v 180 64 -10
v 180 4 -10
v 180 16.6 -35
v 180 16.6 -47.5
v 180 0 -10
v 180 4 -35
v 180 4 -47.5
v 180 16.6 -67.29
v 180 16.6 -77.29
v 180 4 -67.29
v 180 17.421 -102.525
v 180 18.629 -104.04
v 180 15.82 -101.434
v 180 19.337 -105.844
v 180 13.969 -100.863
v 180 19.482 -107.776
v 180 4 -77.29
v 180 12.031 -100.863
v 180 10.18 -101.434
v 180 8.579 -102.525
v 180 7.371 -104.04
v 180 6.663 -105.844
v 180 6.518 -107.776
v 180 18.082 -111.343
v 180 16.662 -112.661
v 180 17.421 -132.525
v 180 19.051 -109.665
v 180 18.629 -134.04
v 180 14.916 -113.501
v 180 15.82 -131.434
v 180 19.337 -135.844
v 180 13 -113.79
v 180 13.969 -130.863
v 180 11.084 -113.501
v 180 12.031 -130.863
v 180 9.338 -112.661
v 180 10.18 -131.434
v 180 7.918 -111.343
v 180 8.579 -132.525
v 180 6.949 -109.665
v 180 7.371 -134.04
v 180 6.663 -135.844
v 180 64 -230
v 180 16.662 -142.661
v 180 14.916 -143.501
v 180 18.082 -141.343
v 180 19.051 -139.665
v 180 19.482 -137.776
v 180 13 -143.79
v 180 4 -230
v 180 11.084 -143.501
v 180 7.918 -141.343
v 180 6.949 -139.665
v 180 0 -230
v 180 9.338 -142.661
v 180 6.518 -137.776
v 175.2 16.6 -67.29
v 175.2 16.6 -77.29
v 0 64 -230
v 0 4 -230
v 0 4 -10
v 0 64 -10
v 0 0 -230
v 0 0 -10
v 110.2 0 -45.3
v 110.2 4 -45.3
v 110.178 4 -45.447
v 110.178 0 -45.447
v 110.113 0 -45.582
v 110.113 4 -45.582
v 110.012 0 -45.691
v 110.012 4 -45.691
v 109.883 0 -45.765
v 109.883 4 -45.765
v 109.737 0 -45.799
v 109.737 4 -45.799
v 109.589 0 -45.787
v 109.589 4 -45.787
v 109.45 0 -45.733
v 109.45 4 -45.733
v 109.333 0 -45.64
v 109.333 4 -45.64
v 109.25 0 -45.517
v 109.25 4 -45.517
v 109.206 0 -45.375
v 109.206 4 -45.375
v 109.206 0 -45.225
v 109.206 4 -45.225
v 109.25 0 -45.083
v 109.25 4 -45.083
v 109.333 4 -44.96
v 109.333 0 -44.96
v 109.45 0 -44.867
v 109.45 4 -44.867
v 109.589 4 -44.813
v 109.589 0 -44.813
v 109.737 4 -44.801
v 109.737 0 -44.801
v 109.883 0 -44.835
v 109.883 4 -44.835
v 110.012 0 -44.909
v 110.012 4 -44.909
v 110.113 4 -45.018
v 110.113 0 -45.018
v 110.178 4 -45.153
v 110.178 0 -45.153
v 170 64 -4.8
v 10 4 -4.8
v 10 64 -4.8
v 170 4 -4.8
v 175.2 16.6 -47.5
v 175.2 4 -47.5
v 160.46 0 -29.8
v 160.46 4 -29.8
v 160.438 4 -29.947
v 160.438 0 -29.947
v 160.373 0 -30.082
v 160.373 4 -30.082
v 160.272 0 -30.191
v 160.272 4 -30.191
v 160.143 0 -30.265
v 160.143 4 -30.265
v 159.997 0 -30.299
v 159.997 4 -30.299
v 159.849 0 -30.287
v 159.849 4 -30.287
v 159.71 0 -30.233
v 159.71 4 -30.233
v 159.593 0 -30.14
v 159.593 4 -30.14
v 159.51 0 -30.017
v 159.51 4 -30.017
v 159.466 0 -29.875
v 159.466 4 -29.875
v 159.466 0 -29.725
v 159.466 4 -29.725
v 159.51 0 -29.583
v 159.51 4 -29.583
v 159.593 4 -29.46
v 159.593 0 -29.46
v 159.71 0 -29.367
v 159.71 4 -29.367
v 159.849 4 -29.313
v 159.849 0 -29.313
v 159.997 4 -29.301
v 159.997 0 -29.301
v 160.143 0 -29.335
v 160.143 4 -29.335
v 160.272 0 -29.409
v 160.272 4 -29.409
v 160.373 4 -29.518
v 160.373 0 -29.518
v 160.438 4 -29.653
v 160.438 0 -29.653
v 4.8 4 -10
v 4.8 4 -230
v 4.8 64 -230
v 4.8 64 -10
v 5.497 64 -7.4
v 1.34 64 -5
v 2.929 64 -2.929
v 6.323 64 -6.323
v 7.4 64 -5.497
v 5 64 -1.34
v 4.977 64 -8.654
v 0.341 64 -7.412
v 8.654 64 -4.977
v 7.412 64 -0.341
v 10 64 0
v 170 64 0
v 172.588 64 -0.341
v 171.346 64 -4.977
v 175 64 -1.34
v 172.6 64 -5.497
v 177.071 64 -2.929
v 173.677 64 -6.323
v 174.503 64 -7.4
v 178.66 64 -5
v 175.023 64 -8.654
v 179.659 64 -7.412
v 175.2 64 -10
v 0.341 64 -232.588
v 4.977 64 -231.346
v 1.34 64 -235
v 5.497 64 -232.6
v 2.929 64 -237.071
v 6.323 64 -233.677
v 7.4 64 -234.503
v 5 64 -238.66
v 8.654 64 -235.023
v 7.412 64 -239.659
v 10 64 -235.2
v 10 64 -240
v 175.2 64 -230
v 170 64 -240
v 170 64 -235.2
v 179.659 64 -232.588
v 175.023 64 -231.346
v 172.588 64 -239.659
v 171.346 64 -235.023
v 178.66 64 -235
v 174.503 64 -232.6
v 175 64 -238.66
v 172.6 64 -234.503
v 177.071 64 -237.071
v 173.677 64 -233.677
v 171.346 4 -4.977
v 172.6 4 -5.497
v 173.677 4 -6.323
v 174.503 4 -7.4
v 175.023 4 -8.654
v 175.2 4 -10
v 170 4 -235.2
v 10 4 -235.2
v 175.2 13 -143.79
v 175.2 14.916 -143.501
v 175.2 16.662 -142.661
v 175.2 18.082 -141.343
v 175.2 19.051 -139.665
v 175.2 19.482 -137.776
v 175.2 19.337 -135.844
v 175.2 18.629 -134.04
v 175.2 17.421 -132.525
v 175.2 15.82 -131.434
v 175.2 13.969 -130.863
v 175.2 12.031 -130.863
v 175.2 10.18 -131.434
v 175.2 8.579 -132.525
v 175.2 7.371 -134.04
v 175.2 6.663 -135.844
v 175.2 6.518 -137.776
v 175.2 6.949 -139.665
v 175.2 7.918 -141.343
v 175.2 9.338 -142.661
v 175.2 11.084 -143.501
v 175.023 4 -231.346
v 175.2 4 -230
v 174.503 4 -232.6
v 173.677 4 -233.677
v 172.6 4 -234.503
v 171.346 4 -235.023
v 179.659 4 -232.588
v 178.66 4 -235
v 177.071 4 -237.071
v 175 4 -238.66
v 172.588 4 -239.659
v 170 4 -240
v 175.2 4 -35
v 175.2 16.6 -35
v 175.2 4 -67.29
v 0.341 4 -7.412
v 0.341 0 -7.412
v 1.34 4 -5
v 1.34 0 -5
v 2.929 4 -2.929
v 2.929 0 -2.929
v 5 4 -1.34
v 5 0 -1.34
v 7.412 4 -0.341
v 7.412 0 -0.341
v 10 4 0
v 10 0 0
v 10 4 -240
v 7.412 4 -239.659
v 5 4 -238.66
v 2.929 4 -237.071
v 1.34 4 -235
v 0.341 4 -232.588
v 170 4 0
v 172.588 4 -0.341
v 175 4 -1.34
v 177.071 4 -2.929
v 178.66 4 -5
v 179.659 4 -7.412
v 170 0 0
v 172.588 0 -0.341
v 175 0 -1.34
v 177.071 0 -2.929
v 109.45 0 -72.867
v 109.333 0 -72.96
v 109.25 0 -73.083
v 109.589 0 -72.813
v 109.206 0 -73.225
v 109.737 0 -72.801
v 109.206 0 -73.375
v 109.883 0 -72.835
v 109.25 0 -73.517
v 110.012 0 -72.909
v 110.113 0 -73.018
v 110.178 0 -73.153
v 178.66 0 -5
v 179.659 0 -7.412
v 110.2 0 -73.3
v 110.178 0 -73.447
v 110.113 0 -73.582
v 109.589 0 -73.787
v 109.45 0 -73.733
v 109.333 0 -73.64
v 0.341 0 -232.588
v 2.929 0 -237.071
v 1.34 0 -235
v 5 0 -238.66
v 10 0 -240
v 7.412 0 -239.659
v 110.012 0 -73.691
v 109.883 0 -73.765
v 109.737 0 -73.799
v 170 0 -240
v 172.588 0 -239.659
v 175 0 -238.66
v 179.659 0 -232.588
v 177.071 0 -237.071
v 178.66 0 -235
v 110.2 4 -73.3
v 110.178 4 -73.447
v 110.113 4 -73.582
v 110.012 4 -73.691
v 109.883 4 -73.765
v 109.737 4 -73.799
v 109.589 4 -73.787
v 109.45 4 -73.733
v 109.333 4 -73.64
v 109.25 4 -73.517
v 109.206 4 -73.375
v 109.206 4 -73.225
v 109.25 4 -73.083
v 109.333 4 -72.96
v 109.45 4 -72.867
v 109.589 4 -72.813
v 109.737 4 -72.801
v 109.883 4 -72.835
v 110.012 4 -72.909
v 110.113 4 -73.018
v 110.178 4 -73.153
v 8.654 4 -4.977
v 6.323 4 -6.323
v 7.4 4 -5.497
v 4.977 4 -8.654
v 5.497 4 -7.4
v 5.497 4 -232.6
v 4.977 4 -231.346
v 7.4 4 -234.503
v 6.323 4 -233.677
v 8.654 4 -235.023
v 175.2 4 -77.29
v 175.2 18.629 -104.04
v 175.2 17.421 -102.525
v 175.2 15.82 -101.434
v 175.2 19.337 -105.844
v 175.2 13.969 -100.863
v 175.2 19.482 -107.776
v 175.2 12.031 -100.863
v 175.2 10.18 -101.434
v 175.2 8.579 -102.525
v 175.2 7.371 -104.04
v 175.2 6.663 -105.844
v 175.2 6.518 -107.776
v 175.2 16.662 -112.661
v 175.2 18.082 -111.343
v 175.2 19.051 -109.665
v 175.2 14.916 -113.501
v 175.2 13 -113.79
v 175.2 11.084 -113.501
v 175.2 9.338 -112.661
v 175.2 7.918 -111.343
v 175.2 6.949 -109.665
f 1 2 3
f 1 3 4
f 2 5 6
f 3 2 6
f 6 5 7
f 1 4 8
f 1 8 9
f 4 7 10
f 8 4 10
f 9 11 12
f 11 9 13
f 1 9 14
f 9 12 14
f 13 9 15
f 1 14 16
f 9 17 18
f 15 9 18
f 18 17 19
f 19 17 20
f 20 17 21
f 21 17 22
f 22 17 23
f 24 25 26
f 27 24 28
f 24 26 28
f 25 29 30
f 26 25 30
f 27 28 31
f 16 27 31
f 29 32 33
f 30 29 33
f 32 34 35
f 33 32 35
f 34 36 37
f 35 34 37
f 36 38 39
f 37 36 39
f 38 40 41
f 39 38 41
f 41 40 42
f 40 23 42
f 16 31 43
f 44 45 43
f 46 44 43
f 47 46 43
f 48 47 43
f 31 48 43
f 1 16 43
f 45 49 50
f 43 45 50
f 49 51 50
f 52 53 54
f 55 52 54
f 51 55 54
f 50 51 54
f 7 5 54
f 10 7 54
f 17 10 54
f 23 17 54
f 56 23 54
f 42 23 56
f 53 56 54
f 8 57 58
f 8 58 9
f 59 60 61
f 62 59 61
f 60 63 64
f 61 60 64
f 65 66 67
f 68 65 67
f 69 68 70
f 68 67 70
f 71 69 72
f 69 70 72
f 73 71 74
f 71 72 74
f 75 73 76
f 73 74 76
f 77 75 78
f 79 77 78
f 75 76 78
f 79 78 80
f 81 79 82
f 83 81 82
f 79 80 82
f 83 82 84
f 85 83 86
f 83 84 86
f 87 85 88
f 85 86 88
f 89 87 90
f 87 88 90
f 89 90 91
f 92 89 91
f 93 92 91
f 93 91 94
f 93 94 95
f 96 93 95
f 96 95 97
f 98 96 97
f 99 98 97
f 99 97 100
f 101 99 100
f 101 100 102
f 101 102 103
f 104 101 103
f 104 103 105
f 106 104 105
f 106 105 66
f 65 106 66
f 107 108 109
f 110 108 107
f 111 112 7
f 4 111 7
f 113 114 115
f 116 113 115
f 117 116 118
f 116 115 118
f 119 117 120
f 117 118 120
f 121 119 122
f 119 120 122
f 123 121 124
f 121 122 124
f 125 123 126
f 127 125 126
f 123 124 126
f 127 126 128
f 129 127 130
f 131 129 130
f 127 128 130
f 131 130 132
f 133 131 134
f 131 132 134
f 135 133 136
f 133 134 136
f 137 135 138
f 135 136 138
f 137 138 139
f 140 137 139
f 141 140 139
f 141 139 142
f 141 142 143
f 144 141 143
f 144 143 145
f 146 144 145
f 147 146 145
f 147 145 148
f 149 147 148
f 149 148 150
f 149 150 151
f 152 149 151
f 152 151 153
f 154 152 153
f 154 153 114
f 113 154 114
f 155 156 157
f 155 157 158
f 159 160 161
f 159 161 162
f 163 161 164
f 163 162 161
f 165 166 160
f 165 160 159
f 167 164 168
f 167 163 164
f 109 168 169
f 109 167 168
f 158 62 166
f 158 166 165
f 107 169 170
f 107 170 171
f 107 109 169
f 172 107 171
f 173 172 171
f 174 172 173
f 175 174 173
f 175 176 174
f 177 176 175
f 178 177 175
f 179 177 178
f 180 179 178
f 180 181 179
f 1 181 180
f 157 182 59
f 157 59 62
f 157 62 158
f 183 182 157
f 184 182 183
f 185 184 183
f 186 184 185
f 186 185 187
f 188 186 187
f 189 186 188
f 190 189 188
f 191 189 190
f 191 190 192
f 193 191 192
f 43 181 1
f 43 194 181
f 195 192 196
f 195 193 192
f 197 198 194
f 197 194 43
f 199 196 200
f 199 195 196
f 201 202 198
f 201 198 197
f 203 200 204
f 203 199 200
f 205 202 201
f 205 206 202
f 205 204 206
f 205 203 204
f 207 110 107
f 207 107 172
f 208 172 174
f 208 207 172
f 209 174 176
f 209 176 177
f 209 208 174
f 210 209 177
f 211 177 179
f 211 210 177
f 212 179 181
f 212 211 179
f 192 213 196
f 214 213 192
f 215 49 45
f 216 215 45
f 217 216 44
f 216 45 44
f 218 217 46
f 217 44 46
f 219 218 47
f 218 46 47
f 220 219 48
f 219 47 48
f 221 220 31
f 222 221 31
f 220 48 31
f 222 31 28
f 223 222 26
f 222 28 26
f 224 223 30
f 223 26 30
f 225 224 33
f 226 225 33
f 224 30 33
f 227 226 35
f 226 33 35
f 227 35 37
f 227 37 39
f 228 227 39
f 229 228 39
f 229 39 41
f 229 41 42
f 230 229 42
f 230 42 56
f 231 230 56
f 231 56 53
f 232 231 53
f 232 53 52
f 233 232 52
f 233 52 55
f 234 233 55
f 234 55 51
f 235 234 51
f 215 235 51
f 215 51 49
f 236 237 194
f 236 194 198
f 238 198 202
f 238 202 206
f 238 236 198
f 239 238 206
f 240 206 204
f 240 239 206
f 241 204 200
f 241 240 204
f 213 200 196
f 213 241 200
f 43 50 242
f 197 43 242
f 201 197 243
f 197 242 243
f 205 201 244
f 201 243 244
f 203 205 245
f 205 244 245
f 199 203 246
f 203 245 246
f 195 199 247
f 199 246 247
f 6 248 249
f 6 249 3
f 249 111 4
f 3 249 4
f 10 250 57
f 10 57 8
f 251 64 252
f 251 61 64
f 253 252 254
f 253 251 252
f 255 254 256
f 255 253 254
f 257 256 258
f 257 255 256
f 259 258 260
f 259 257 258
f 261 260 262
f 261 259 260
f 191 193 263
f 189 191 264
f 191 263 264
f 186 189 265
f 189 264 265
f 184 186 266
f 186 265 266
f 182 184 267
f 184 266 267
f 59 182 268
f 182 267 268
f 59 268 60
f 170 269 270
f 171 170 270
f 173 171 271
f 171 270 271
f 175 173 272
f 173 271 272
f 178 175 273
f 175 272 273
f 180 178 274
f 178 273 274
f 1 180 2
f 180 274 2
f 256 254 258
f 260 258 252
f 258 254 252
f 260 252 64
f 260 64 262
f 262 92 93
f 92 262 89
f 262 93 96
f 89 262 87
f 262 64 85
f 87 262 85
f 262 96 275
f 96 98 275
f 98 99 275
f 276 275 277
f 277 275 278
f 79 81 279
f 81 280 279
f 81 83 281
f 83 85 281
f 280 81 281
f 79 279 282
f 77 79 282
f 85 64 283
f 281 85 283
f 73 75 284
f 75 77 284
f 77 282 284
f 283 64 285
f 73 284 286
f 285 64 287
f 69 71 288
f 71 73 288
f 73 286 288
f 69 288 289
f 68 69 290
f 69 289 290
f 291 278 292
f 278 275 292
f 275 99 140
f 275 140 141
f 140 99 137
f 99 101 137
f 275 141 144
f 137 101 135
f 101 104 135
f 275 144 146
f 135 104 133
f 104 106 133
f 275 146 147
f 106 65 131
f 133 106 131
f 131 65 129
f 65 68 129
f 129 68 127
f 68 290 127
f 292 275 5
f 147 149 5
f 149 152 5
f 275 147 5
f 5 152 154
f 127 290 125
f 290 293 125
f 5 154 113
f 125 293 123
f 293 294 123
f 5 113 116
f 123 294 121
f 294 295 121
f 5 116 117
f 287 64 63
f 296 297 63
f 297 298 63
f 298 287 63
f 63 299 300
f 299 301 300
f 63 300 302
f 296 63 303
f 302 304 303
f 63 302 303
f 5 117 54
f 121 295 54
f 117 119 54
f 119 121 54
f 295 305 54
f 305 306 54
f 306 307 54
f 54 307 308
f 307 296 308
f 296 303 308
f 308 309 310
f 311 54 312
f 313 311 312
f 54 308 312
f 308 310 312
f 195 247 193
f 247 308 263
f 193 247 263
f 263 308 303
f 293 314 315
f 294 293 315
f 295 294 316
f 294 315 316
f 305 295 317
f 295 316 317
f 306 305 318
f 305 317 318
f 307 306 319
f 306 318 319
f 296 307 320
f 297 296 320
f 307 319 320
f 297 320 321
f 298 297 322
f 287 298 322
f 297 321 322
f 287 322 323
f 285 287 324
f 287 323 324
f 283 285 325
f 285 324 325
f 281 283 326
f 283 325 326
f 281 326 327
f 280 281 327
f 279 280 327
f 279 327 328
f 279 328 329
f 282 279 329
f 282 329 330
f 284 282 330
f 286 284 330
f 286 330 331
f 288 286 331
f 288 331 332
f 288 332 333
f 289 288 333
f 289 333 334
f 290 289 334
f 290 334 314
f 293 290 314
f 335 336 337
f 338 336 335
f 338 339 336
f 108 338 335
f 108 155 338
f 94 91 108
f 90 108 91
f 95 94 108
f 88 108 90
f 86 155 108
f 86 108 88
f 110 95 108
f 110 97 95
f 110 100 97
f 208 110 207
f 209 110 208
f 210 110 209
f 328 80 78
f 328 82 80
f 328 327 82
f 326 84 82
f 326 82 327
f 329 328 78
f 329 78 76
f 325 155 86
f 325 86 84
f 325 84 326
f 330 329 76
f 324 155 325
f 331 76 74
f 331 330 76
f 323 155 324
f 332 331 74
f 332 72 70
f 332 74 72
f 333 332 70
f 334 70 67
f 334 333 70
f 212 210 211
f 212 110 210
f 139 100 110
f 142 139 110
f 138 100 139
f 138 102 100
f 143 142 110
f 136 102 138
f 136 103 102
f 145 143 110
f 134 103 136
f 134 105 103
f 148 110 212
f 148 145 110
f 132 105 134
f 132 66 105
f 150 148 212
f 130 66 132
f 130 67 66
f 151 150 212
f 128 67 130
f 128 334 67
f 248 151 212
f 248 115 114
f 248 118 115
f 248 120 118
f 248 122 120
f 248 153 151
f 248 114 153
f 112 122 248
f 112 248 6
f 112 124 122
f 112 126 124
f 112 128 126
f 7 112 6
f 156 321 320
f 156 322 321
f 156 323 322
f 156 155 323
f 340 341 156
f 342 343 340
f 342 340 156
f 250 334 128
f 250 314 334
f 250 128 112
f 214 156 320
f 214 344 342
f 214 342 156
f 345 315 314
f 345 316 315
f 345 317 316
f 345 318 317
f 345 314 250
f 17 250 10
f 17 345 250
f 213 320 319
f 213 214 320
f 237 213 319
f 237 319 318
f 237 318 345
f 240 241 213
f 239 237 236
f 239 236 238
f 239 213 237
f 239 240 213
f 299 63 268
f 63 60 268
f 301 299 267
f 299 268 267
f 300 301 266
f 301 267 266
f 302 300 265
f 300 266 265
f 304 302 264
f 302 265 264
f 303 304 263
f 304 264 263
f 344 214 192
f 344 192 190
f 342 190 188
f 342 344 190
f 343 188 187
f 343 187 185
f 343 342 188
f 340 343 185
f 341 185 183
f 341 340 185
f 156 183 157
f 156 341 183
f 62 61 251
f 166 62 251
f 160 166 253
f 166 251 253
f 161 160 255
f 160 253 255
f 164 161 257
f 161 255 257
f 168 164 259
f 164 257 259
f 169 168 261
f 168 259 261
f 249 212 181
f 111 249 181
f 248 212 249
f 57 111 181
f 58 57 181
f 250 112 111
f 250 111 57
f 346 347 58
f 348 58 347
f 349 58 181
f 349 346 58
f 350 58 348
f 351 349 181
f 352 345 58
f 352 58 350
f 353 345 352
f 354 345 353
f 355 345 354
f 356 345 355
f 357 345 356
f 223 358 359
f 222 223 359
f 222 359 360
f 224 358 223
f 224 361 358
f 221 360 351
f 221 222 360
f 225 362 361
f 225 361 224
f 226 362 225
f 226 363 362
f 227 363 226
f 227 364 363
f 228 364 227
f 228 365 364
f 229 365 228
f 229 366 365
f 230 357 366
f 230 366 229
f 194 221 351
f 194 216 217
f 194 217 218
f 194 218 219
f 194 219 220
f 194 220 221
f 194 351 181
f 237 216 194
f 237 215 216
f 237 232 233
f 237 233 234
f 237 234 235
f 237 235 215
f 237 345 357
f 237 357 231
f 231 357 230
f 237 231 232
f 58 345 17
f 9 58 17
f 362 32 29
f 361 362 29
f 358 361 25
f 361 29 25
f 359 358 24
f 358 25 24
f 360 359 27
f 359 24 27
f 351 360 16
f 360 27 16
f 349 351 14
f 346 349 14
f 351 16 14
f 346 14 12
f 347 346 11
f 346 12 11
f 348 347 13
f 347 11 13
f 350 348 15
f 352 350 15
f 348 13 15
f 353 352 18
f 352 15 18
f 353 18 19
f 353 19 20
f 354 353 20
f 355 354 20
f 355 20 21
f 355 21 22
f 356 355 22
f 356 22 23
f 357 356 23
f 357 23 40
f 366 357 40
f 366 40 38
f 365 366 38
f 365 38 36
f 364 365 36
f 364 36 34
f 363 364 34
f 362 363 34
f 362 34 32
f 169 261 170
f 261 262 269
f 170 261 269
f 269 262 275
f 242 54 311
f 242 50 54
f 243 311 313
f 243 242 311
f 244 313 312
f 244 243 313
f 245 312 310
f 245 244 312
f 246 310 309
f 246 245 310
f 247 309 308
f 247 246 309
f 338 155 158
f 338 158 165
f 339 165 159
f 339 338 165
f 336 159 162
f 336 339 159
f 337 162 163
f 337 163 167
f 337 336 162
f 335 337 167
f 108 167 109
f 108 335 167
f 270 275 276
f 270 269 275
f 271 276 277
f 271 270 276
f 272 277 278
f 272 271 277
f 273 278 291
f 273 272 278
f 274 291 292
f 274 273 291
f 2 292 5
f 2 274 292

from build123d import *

# Parameters (mm, degrees)
SKETCH1_W               = 180
SKETCH1_H               = 240
BOSS_EXTRUDE1_DEPTH     = 4
FILLET1_R               = 10
BOSS_EXTRUDE2_DEPTH     = 60
SKETCH3_R               = 0.5
CUT_EXTRUDE1_DEPTH      = 61
CUT_EXTRUDE1_DEPTH_BACK = 5
SKETCH4_W               = 15
SKETCH4_H               = 12.5
SKETCH4_W_2             = 20
SKETCH4_H_2             = 10
CUT_EXTRUDE2_DEPTH      = 12.6
SKETCH5_R               = 6.5
CUT_EXTRUDE3_DEPTH      = 12.6


with BuildPart() as part:
    # Sketch1 → Boss-Extrude1 (new body)
    with BuildSketch(Plane(origin=(0, 0, 0), x_dir=(1, 0, 0), z_dir=(0, 1, 0))):
        with Locations((90, 120)):
            Rectangle(SKETCH1_W, SKETCH1_H)
    extrude(amount=BOSS_EXTRUDE1_DEPTH)

    # Fillet1
    fillet1_edges = [part.edges().sort_by_distance(p)[0] for p in [
        (0, 2, -240),
        (180, 2, -240),
        (180, 2, 0),
        (0, 2, 0),
    ]]
    fillet(fillet1_edges, radius=FILLET1_R)

    # Sketch2 → Boss-Extrude2 (add)
    with BuildSketch(Plane(origin=(0, 4, 0), x_dir=(1, 0, 0), z_dir=(0, 1, 0))):
        with BuildLine():
            Line((170, 240), (10, 240))
            ThreePointArc((10, 240), (2.928932188, 237.071067812), (0, 230))
            Line((0, 230), (0, 10))
            ThreePointArc((0, 10), (2.928932188, 2.928932188), (10, 0))
            Line((10, 0), (170, 0))
            ThreePointArc((170, 0), (177.071067812, 2.928932188), (180, 10))
            Line((180, 10), (180, 230))
            ThreePointArc((180, 230), (177.071067812, 237.071067812), (170, 240))
        make_face()
        with BuildLine():
            Line((170, 235.2), (10, 235.2))
            ThreePointArc((10, 235.2), (6.323044738, 233.676955262), (4.8, 230))
            Line((4.8, 230), (4.8, 10))
            ThreePointArc((4.8, 10), (6.323044738, 6.323044738), (10, 4.8))
            Line((10, 4.8), (170, 4.8))
            ThreePointArc((170, 4.8), (173.676955262, 6.323044738), (175.2, 10))
            Line((175.2, 10), (175.2, 230))
            ThreePointArc((175.2, 230), (173.676955262, 233.676955262), (170, 235.2))
        make_face(mode=Mode.SUBTRACT)
    extrude(amount=BOSS_EXTRUDE2_DEPTH)

    # Sketch3 → Cut-Extrude1 (cut, two sides)
    with BuildSketch(Plane(origin=(0, 4, 0), x_dir=(1, 0, 0), z_dir=(0, 1, 0))) as cut_extrude1_sk:
        with Locations((159.96, 29.8)):
            Circle(SKETCH3_R)
        with Locations((109.7, 45.3)):
            Circle(SKETCH3_R)
        with Locations((109.7, 73.3)):
            Circle(SKETCH3_R)
    extrude(amount=CUT_EXTRUDE1_DEPTH, mode=Mode.SUBTRACT)
    extrude(cut_extrude1_sk.sketch, amount=-CUT_EXTRUDE1_DEPTH_BACK, mode=Mode.SUBTRACT)

    # Sketch4 → Cut-Extrude2 (cut)
    with BuildSketch(Plane(origin=(0, 4, 0), x_dir=(1, 0, 0), z_dir=(0, 1, 0))):
        with Locations((175.2, 41.25)):
            Rectangle(SKETCH4_W, SKETCH4_H)
        with Locations((175.2, 72.29)):
            Rectangle(SKETCH4_W_2, SKETCH4_H_2)
    extrude(amount=CUT_EXTRUDE2_DEPTH, mode=Mode.SUBTRACT)

    # Sketch5 → Cut-Extrude3 (cut)
    with BuildSketch(Plane(origin=(180, 0, 0), x_dir=(0, 0, -1), z_dir=(1, 0, 0))):
        with Locations((107.29, 13)):
            Circle(SKETCH5_R)
        with Locations((137.29, 13)):
            Circle(SKETCH5_R)
    extrude(amount=-CUT_EXTRUDE3_DEPTH, mode=Mode.SUBTRACT)


solid = part.part
